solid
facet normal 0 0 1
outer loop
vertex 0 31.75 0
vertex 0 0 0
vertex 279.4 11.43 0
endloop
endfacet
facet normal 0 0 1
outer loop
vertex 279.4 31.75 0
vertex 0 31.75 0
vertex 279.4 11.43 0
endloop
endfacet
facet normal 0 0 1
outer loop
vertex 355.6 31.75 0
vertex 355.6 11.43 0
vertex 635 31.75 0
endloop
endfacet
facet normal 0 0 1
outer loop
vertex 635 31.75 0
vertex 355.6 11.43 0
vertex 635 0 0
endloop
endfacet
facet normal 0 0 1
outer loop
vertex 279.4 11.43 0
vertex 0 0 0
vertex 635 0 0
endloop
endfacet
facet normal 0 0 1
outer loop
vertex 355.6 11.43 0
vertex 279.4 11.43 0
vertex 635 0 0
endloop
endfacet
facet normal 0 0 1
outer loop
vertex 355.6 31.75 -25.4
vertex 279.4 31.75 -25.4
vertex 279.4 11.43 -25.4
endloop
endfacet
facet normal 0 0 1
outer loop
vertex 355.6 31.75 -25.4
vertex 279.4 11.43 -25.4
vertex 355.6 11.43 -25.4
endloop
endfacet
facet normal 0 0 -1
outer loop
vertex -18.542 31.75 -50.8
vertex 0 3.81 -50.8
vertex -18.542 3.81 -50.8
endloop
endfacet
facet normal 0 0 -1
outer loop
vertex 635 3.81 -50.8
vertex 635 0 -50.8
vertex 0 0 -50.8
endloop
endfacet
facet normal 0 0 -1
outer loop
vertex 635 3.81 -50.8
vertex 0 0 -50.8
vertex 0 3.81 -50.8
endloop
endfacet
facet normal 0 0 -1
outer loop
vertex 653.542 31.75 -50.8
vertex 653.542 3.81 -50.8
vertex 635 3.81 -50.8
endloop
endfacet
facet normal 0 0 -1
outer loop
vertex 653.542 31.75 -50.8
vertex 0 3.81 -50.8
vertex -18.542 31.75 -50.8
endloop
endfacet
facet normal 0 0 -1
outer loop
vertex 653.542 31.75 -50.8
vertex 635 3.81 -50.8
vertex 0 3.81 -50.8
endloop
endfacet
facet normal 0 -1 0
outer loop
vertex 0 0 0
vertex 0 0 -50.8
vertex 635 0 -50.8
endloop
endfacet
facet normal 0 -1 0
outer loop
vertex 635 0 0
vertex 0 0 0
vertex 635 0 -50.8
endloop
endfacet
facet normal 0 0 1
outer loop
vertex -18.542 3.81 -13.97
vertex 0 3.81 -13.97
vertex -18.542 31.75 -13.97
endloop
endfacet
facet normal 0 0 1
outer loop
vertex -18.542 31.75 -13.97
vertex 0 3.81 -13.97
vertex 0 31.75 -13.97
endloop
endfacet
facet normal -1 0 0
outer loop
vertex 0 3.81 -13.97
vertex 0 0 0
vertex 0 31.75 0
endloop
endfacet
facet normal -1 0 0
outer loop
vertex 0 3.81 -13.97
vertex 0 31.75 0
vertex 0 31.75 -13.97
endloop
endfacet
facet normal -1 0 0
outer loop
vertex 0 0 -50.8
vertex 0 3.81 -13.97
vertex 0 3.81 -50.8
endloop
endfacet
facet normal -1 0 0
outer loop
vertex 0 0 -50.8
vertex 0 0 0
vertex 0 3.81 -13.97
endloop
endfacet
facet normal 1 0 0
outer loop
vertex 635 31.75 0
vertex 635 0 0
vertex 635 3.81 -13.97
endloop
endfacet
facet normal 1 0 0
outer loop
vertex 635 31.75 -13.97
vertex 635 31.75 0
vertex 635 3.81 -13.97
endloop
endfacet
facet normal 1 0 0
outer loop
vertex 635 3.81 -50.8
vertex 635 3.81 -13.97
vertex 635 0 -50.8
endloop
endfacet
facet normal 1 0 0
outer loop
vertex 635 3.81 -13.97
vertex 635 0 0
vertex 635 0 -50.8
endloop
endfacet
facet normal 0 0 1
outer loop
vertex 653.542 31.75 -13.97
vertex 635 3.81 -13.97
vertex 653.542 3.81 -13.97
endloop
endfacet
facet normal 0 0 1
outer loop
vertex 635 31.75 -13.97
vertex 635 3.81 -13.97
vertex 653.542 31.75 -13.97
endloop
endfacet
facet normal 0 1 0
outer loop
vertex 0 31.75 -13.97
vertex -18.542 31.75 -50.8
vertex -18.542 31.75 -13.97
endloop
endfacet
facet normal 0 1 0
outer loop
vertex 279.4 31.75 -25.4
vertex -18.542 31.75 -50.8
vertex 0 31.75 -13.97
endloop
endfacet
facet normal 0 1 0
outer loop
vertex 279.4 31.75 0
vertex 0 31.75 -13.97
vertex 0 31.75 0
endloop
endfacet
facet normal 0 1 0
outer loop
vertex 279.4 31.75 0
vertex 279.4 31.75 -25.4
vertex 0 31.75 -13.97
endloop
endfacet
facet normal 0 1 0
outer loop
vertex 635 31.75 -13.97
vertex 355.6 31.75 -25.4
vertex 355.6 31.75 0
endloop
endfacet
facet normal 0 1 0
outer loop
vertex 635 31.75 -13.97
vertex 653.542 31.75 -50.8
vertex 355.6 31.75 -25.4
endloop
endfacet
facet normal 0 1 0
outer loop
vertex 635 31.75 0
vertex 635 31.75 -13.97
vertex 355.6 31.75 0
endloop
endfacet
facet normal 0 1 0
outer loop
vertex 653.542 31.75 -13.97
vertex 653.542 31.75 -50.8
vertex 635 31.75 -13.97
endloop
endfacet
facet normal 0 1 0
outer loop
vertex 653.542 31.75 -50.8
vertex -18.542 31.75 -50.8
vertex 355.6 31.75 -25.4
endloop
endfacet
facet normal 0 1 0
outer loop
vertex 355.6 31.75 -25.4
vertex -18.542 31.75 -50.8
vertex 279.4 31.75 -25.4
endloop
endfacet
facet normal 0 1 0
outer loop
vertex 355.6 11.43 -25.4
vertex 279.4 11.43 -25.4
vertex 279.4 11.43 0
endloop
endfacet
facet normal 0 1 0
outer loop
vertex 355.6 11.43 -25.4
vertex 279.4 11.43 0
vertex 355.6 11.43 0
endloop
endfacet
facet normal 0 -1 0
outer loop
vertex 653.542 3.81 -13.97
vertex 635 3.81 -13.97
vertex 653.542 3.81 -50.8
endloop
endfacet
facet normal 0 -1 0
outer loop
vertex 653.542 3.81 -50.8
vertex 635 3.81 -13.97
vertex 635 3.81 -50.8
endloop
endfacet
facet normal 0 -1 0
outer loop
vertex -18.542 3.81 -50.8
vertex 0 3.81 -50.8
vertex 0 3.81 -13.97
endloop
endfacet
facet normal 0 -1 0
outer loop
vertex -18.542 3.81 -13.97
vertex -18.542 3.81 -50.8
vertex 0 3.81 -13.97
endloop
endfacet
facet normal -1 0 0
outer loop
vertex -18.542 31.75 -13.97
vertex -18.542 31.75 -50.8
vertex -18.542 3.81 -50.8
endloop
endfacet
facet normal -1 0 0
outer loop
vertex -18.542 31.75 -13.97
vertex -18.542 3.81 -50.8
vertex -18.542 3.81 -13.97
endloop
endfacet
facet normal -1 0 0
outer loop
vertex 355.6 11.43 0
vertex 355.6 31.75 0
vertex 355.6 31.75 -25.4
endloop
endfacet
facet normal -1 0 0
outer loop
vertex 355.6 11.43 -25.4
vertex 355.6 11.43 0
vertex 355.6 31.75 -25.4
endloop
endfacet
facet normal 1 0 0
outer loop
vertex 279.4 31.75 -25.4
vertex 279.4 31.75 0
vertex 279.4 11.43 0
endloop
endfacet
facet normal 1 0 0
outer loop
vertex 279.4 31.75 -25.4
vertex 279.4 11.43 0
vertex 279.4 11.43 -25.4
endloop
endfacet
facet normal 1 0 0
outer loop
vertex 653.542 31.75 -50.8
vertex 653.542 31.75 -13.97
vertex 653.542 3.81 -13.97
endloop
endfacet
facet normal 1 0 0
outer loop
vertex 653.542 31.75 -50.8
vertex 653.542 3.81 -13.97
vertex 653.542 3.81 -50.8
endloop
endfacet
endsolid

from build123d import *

# Parameters (mm, degrees)
SKETCH1_W           = 635
SKETCH1_H           = 50.8
BOSS_EXTRUDE1_DEPTH = 31.75
SKETCH2_W           = 36.83
SKETCH2_H           = 27.94
BOSS_EXTRUDE2_DEPTH = 18.542
SKETCH3_W           = 36.83
SKETCH3_H           = 27.94
BOSS_EXTRUDE3_DEPTH = 18.542
SKETCH4_W           = 76.2
SKETCH4_H           = 25.4
CUT_EXTRUDE1_DEPTH  = 20.32


with BuildPart() as part:
    # Sketch1 → Boss-Extrude1 (new body)
    with BuildSketch(Plane(origin=(0, 0, 0), x_dir=(1, 0, 0), z_dir=(0, 1, 0))):
        with Locations((317.5, 25.4)):
            Rectangle(SKETCH1_W, SKETCH1_H)
    extrude(amount=BOSS_EXTRUDE1_DEPTH)

    # Sketch2 → Boss-Extrude2 (add)
    with BuildSketch(Plane(origin=(635, 0, 0), x_dir=(0, 0, -1), z_dir=(1, 0, 0))):
        with Locations((32.385, 17.78)):
            Rectangle(SKETCH2_W, SKETCH2_H)
    extrude(amount=BOSS_EXTRUDE2_DEPTH)

    # Sketch3 → Boss-Extrude3 (add)
    with BuildSketch(Plane.ZY):
        with Locations((-32.385, 17.78)):
            Rectangle(SKETCH3_W, SKETCH3_H)
    extrude(amount=BOSS_EXTRUDE3_DEPTH)

    # Sketch4 → Cut-Extrude1 (cut)
    with BuildSketch(Plane(origin=(0, 31.75, 0), x_dir=(1, 0, 0), z_dir=(0, 1, 0))):
        with Locations((317.5, 12.7)):
            Rectangle(SKETCH4_W, SKETCH4_H)
    extrude(amount=-CUT_EXTRUDE1_DEPTH, mode=Mode.SUBTRACT)


solid = part.part
